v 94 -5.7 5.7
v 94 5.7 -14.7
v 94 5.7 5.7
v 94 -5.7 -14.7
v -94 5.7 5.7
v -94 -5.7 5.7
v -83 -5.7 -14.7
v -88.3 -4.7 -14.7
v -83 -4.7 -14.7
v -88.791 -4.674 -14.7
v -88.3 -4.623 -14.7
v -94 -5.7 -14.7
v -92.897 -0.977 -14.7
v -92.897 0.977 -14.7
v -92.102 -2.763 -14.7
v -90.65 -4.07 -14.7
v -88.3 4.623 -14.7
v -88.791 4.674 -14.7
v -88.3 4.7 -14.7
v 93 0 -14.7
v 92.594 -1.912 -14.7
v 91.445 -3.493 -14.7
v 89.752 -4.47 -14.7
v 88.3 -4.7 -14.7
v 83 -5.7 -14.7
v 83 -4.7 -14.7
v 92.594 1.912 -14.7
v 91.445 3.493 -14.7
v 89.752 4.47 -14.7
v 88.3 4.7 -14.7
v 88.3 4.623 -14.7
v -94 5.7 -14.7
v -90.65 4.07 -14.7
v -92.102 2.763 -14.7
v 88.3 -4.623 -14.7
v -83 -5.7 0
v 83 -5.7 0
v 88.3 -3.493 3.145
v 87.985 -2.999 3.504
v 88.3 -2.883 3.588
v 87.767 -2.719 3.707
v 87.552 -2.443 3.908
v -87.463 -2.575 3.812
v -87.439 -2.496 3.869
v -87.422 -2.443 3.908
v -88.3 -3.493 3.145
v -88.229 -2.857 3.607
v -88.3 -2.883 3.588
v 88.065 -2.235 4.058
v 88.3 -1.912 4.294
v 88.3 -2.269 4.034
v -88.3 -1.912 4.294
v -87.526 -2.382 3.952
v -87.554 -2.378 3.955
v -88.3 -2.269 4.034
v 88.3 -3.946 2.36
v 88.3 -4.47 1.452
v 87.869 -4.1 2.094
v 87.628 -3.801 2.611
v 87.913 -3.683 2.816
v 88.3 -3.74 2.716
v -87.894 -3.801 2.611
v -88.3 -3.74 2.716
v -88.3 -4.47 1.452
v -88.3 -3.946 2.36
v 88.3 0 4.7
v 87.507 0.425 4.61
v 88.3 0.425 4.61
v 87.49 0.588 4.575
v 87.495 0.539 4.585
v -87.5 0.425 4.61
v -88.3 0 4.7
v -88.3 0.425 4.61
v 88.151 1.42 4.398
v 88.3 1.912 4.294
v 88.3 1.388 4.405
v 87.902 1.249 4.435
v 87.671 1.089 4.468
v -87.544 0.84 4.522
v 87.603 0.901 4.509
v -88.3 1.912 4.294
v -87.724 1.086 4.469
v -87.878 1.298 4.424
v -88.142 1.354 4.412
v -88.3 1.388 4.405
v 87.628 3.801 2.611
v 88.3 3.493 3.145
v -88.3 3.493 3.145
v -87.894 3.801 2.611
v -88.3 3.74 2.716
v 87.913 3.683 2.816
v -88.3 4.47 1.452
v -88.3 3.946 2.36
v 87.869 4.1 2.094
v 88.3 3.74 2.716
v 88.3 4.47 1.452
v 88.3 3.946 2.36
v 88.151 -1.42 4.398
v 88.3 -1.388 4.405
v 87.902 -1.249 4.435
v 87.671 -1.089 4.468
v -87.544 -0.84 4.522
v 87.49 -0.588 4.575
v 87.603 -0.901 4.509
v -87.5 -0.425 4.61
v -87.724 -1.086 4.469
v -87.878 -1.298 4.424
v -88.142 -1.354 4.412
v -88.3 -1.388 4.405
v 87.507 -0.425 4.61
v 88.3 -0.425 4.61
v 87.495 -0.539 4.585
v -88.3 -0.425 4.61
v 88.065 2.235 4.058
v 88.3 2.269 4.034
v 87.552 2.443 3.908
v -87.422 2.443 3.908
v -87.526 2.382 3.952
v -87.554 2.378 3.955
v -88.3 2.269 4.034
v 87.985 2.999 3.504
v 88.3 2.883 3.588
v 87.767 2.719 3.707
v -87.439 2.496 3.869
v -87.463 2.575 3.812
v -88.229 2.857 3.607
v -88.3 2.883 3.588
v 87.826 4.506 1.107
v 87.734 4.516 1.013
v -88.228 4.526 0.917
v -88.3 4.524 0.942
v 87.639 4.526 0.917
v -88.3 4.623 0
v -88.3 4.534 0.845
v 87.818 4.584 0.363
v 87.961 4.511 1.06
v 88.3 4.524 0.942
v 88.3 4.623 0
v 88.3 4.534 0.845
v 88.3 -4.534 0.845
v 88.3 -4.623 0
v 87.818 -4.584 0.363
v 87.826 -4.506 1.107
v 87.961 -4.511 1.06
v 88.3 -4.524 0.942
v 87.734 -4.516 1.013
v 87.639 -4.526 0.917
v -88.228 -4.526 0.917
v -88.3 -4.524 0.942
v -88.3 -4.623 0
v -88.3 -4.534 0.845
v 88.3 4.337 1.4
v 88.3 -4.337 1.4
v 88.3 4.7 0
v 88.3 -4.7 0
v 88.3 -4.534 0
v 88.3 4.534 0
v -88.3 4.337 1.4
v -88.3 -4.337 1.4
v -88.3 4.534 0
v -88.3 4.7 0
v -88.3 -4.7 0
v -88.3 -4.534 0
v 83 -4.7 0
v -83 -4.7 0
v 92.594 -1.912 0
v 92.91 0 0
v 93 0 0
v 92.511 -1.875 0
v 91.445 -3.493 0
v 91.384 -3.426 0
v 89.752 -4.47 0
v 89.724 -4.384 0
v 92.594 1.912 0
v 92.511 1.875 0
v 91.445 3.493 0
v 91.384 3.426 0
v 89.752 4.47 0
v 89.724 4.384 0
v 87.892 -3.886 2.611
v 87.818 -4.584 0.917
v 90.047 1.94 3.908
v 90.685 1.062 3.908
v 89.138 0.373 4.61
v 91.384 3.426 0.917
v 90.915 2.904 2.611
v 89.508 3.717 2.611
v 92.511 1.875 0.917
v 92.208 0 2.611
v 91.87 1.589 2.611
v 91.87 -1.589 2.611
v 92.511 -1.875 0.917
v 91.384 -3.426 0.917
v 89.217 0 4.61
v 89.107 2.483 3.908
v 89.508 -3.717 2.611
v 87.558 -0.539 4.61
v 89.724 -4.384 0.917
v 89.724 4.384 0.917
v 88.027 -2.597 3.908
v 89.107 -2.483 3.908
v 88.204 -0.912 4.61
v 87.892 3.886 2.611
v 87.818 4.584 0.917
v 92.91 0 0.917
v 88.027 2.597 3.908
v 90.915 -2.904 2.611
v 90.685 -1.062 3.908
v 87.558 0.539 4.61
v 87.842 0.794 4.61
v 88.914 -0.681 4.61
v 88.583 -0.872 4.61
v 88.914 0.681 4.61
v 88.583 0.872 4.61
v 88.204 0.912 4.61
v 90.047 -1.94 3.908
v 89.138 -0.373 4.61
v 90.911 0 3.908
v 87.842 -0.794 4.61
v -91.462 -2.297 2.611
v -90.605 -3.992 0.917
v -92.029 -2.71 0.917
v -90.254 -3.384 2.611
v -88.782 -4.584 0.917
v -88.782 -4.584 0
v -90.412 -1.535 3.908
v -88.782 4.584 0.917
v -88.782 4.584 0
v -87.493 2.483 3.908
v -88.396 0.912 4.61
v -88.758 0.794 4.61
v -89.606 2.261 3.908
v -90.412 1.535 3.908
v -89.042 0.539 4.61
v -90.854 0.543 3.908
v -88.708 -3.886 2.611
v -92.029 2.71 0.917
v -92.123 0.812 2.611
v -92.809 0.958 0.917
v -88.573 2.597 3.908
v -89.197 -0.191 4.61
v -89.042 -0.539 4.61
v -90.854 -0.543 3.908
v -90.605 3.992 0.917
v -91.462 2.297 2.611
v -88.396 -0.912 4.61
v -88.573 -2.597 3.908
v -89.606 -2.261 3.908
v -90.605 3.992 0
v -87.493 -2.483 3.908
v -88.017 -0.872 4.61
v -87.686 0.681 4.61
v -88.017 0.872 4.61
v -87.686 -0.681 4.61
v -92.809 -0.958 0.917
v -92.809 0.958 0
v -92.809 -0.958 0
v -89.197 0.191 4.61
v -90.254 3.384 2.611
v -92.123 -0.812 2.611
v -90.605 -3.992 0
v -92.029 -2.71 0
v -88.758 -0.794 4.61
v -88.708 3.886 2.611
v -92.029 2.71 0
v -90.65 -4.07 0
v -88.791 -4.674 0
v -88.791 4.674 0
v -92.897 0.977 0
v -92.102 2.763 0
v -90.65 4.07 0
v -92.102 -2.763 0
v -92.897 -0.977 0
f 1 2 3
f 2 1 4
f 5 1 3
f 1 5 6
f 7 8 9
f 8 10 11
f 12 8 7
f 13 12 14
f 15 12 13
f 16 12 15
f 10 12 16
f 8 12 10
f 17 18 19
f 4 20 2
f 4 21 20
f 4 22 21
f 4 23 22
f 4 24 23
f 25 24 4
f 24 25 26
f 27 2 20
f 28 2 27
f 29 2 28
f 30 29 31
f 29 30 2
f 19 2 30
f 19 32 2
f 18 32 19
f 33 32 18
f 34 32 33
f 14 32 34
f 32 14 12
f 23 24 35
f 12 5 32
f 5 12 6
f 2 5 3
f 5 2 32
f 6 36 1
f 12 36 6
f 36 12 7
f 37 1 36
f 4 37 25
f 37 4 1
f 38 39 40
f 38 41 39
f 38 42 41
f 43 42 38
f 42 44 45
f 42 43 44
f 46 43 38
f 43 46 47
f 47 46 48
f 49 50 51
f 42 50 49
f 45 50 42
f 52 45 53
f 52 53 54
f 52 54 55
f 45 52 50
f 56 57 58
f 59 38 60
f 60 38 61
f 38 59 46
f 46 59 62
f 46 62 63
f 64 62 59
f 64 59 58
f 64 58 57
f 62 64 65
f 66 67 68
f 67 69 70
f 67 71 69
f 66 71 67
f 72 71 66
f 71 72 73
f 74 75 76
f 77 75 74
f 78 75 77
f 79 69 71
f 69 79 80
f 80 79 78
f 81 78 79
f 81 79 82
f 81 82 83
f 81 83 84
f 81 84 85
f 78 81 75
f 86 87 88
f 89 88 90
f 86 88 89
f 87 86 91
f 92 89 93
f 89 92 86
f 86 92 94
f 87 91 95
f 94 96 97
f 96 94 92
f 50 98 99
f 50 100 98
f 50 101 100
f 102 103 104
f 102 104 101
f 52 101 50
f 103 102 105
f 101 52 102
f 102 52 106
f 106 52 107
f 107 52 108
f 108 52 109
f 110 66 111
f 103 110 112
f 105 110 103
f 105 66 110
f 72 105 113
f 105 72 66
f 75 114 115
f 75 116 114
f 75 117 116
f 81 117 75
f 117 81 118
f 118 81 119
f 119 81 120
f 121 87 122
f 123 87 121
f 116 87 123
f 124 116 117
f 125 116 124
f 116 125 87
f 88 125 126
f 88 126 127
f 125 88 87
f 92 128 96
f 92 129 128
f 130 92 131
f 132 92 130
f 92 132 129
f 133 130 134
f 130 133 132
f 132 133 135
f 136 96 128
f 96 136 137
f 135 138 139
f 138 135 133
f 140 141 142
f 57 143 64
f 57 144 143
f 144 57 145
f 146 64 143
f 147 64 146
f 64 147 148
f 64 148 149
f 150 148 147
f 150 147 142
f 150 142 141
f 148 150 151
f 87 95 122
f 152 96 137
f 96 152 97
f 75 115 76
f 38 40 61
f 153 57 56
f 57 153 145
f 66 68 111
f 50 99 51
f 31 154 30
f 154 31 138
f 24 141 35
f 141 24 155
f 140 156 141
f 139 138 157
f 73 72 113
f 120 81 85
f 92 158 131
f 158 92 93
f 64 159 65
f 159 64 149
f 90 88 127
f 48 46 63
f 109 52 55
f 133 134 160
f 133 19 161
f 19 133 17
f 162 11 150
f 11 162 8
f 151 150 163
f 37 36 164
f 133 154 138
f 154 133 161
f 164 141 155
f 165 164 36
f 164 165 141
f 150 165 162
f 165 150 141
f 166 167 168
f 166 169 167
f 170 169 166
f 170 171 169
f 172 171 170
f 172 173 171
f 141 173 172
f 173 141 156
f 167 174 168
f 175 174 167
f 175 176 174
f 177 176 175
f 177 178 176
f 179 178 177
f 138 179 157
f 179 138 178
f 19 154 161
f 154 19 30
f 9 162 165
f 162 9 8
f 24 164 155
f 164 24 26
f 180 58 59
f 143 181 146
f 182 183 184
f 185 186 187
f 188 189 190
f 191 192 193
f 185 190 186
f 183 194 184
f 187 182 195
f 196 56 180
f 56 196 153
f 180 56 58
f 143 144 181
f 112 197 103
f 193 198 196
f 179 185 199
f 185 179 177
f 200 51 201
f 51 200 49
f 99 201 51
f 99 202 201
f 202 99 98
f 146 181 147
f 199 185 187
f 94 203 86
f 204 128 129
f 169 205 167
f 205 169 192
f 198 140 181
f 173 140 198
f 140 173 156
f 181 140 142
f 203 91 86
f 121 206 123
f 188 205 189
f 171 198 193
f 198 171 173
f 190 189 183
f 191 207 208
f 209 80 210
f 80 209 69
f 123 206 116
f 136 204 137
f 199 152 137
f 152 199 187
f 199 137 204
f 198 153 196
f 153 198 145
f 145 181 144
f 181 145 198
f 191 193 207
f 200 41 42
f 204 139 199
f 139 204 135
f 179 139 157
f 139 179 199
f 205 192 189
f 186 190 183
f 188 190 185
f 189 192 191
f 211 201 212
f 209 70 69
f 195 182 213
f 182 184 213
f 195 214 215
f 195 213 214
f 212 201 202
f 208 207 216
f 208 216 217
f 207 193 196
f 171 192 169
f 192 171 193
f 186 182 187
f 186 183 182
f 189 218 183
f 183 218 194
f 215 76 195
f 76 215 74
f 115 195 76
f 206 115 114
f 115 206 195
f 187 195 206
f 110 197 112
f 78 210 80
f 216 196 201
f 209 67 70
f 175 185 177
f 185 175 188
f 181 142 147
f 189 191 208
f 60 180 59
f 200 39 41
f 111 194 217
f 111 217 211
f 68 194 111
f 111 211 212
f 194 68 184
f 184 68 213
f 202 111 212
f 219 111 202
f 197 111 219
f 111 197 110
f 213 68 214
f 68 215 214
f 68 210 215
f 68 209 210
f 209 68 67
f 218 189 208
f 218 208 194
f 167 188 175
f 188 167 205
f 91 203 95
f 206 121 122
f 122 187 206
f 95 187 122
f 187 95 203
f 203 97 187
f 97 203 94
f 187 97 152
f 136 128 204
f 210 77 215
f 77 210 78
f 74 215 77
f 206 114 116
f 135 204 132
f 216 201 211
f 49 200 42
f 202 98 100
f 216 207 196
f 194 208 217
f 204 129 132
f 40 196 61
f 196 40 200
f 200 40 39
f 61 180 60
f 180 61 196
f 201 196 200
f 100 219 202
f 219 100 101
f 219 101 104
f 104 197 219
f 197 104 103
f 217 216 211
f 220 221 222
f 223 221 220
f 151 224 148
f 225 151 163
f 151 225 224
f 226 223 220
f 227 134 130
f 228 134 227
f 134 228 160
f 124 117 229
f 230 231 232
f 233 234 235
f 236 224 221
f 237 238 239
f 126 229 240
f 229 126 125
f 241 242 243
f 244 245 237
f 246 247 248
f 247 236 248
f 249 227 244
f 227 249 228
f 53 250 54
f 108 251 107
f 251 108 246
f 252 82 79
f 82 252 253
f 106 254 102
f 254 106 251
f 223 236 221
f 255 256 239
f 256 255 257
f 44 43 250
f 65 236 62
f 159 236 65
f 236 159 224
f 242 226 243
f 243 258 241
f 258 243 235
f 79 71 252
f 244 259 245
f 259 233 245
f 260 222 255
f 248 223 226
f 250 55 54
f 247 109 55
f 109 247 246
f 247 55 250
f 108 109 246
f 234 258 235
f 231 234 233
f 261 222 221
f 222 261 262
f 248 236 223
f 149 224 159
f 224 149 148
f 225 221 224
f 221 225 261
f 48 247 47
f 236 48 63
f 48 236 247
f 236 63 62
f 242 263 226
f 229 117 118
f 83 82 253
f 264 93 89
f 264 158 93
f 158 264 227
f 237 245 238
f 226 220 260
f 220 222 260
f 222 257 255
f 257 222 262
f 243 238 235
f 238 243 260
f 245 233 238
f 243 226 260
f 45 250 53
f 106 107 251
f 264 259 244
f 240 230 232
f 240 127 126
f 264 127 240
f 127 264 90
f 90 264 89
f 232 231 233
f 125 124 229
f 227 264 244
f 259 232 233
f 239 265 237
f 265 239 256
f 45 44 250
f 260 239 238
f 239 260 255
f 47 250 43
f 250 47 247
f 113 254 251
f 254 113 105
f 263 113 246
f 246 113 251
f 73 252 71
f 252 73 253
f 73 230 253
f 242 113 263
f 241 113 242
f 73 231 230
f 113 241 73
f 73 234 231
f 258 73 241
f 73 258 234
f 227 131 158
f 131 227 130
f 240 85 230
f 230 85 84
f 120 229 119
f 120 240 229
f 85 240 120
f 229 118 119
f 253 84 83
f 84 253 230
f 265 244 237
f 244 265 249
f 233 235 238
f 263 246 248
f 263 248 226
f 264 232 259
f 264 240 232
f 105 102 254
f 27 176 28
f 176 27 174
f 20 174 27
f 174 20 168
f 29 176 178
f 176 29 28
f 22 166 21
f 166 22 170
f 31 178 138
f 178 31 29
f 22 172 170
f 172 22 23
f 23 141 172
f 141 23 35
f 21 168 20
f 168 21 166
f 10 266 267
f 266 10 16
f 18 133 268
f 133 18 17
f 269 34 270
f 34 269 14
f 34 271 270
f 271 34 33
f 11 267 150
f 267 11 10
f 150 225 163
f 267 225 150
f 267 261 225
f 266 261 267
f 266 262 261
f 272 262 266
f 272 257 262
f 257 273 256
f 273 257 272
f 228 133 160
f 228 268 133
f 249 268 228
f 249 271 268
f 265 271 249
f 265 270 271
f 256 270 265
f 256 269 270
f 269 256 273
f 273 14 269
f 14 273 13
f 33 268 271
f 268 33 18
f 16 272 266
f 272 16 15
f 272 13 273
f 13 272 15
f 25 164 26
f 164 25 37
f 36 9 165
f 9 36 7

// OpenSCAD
r=4.7;
r2 = 5.2;
th = 1; // thickness
ipad_lng = 186;
over_lng = 10;

difference() {
  translate([0,0,+th/2-over_lng/2]) cube(size=[ipad_lng+2*th, r*2+2*th, r*2+th+over_lng], center=true);
  rotate(a=[0,-90,0]) cylinder(h=ipad_lng-r*2, r=r, center=true);
  translate([0,0,-200]) cube(size=[ipad_lng-r*2, r*2, 400], center=true);
  translate([ipad_lng/2-r,0,0]) sphere(r=r,center=true);
  translate([-ipad_lng/2+r,0,0]) sphere(r=r,center=true);
  translate([ipad_lng/2-r,0,-2000]) cylinder(h=4000, r=r, center=true);
  translate([-ipad_lng/2+r,0,-2000]) cylinder(h=4000, r=r, center=true);
  translate([0, -200, -200]) cube(size=[ipad_lng-over_lng*2, 400, 400], center=true);
}
